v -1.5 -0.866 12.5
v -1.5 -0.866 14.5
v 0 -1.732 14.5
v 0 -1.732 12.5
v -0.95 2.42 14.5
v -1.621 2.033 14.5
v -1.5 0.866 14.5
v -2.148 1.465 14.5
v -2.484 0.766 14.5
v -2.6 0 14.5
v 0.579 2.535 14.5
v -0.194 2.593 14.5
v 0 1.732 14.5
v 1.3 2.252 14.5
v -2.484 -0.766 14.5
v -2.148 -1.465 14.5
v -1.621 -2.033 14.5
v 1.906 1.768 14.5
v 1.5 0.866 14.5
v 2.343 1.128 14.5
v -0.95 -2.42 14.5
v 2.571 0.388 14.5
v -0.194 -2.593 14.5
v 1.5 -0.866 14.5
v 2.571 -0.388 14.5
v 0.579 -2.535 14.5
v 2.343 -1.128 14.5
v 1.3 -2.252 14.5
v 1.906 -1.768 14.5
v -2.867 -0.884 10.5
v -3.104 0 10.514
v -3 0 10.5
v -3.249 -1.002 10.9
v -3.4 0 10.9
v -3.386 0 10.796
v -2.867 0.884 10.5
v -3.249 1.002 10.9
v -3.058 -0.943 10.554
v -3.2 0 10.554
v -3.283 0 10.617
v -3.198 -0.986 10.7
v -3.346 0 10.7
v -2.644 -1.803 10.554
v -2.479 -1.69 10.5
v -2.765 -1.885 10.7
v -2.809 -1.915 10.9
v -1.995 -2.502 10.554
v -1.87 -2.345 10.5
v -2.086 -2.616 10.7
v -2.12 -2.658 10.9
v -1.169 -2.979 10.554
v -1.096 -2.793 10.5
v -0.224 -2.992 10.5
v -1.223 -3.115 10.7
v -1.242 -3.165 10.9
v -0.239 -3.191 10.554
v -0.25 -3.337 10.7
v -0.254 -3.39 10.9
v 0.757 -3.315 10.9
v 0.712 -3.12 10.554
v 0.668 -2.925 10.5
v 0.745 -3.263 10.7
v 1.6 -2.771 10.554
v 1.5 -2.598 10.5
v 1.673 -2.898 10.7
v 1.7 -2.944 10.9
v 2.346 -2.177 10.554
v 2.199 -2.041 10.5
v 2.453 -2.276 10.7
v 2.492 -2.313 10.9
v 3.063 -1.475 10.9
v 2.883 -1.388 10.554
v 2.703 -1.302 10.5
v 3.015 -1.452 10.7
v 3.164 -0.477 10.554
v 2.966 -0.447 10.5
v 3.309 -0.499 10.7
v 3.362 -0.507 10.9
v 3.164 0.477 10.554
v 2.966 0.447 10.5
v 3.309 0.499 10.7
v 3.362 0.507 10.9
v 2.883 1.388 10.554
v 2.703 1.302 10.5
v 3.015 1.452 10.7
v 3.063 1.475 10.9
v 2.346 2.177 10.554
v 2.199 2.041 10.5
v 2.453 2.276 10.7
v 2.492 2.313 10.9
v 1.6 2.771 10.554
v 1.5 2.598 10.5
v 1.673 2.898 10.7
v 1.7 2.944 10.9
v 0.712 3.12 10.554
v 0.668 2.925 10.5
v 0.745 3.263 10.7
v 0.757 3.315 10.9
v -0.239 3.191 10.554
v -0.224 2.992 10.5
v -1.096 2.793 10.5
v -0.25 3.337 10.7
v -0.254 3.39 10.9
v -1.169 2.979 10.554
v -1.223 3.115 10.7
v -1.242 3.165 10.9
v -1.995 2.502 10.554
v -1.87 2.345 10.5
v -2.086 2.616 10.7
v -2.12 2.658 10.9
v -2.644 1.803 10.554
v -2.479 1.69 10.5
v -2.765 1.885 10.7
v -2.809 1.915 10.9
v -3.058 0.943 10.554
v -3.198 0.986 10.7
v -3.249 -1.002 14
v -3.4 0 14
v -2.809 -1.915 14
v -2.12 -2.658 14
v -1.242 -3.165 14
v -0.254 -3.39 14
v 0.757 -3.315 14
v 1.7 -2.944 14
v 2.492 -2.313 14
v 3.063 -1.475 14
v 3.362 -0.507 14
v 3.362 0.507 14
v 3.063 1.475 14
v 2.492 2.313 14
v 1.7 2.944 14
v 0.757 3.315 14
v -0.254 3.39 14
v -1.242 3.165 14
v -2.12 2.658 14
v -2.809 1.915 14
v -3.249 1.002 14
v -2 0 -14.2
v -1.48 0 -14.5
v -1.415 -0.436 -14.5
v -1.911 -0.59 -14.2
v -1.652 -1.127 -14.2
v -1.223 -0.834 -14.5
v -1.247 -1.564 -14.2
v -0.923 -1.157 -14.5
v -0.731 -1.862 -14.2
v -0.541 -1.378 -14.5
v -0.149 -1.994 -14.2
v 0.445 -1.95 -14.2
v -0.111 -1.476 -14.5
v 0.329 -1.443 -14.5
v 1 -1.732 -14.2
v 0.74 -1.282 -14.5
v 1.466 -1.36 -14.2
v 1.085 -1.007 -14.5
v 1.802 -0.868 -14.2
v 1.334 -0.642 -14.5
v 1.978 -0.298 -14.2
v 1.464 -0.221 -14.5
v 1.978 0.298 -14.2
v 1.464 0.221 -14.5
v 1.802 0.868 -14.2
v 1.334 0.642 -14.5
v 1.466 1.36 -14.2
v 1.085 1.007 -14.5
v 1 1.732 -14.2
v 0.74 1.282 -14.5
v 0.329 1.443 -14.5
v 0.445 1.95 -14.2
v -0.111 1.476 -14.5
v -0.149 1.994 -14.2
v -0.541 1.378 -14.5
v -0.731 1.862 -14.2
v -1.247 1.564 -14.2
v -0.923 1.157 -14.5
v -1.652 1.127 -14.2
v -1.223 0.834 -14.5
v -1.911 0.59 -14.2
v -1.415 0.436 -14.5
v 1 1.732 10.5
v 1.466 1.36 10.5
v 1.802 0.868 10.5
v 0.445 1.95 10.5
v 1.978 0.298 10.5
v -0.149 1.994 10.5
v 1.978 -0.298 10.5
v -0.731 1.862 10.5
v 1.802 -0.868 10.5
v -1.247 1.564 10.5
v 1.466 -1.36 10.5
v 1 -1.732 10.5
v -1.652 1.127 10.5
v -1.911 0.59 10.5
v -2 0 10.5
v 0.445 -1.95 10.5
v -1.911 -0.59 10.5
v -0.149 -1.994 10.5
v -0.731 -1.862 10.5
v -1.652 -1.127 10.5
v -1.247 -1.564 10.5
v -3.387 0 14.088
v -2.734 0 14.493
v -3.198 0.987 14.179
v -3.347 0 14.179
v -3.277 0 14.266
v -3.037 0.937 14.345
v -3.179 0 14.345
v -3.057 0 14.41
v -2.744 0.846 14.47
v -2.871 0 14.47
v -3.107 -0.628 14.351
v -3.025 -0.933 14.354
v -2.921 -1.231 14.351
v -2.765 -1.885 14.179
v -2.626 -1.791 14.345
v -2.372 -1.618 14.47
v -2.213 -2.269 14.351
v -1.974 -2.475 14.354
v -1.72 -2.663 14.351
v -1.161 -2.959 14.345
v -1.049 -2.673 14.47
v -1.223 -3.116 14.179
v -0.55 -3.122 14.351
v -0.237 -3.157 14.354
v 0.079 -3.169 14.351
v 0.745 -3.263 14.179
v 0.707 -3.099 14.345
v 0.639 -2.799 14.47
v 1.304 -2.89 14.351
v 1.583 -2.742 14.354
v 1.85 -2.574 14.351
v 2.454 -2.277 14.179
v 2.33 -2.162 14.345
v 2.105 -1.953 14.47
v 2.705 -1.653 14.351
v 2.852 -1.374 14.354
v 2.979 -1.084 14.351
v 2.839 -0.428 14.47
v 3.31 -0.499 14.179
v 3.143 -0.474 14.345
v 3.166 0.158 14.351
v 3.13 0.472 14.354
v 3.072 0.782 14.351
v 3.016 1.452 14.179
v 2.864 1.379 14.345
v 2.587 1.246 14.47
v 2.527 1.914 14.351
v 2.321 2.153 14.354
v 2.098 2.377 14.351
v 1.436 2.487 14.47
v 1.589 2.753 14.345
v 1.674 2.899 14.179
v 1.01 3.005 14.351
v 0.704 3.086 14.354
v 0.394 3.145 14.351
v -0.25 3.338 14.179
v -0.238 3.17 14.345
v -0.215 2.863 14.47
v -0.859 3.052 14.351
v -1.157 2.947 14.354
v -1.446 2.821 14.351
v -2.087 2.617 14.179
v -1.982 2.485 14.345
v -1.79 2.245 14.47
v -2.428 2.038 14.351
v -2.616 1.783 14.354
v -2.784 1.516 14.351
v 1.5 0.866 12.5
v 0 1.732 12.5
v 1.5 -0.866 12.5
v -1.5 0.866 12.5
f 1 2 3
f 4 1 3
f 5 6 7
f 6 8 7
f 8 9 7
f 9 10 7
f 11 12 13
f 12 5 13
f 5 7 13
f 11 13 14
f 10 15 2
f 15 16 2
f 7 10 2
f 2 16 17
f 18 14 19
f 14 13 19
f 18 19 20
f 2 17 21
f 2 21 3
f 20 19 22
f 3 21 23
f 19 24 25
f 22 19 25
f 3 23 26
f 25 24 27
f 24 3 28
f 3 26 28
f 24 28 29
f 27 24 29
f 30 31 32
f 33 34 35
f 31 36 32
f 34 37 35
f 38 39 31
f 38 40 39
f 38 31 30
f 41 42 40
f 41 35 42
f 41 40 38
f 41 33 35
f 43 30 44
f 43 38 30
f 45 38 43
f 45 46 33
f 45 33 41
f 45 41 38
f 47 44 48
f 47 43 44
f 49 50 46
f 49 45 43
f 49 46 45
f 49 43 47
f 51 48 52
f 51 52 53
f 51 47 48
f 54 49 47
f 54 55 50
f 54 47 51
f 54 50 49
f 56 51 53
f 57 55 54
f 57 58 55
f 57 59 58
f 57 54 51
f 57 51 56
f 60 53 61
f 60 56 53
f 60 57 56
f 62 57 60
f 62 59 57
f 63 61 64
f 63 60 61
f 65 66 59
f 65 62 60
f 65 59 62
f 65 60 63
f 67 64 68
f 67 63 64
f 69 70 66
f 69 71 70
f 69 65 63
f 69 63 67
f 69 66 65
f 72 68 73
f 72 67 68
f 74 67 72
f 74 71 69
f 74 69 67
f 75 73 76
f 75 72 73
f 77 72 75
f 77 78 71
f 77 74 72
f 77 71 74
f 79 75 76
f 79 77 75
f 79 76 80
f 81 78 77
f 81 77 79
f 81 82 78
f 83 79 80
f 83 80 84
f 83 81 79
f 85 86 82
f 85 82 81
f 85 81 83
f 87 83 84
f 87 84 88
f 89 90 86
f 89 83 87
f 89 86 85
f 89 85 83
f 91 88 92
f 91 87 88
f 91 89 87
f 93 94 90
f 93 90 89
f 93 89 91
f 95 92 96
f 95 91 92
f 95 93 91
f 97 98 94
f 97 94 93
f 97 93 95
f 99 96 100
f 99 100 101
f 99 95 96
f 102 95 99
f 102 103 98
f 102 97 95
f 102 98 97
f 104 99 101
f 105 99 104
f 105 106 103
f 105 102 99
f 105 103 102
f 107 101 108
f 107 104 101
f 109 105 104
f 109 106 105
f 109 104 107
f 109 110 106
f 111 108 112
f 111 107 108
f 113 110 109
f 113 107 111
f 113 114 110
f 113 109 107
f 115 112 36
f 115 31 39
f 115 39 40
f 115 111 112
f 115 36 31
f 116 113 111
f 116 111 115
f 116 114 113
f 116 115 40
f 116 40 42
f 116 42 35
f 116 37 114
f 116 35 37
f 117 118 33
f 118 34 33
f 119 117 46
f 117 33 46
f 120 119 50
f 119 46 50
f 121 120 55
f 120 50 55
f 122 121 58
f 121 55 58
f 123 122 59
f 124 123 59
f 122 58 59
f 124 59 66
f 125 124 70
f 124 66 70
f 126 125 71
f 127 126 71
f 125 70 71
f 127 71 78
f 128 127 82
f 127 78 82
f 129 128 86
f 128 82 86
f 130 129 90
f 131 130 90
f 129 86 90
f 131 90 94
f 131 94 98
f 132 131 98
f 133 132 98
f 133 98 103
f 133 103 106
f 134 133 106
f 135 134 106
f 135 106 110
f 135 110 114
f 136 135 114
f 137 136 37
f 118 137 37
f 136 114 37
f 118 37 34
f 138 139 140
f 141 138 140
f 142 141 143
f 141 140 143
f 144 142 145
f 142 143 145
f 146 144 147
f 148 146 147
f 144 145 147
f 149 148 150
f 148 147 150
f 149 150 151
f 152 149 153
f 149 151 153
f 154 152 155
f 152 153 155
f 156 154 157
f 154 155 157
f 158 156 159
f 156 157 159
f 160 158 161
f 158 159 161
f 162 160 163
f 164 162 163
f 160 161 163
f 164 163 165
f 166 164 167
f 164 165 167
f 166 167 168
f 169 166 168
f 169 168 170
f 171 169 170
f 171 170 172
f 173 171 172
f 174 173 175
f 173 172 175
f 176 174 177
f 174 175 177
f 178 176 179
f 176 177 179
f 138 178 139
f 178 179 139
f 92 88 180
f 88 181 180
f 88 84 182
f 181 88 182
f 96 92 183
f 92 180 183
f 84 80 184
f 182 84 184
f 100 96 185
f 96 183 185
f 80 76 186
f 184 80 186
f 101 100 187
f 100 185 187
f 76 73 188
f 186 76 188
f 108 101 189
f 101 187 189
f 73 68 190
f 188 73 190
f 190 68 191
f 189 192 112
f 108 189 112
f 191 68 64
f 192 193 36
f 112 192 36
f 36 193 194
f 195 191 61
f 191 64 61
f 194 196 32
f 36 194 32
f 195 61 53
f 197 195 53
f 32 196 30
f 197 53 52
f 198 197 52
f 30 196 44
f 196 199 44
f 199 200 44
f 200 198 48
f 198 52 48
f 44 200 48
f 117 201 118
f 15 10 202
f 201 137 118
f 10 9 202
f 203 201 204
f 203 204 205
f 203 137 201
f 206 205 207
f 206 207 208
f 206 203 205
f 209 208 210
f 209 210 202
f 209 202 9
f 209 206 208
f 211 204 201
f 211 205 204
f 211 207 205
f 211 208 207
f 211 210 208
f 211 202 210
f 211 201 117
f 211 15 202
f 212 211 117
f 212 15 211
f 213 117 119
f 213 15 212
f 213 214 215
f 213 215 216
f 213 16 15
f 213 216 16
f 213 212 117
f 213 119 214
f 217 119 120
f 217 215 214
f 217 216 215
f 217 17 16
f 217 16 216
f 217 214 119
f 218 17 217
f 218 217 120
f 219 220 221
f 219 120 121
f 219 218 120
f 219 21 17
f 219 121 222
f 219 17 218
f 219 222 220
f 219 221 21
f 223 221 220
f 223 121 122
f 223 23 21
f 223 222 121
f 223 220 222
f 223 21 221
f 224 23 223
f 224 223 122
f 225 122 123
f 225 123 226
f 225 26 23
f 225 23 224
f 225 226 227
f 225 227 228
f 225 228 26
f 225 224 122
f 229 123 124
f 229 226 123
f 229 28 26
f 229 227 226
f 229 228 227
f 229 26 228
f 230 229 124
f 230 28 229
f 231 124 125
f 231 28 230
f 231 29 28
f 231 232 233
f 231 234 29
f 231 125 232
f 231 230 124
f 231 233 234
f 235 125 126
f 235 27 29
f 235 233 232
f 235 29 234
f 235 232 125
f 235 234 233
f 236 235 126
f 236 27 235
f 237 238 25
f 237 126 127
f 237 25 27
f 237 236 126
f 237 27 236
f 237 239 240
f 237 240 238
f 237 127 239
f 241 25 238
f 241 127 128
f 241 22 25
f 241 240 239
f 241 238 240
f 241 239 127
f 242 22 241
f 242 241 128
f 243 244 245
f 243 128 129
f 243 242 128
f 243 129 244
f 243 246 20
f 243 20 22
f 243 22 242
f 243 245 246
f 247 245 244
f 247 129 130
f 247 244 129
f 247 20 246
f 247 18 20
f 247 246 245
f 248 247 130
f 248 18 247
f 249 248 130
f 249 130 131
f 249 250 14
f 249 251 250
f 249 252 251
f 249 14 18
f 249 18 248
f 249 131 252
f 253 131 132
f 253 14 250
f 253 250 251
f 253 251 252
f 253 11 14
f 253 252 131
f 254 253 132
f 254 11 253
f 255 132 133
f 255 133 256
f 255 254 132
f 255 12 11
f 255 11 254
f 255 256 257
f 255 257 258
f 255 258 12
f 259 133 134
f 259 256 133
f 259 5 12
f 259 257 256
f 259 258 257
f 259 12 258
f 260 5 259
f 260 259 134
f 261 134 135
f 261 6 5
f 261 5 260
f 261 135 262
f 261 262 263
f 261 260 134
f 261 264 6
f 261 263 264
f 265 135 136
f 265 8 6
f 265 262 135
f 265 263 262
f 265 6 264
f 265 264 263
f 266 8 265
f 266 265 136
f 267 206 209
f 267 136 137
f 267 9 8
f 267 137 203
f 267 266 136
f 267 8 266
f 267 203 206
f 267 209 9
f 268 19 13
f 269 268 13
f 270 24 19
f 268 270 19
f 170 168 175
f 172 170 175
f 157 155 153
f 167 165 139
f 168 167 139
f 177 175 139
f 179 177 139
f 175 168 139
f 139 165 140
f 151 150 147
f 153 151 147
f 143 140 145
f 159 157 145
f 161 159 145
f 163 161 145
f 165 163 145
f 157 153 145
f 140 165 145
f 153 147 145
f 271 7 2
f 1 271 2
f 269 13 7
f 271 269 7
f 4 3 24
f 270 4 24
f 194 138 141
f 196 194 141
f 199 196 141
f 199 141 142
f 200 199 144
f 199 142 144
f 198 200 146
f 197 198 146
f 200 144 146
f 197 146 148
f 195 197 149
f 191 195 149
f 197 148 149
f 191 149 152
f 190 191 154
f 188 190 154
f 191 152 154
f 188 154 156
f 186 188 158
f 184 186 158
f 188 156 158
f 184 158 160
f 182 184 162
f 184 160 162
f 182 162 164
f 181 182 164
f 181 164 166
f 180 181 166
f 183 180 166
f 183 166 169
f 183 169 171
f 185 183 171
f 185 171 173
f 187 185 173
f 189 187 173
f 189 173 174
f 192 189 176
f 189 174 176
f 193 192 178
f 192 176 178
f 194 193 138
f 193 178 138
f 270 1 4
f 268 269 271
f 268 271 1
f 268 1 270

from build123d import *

# Parameters (mm, degrees)
CHAMFER_1_SIZE      = 0.3
CHAMFER_1_SIZE2     = 0.519615242
FILLET_1_R          = 0.4
FILLET_2_SIZE       = 0.5
FILLET_2_SIZE_2     = 0.8
CUT_EXTRUDE_1_DEPTH = 2


with BuildPart() as part:
    # 草图2 → 旋转1 (revolve)
    with BuildSketch(Plane(origin=(0, 0, 0), x_dir=(0, 0, -1), z_dir=(1, 0, 0)), mode=Mode.PRIVATE) as revolve_1_sk:
        Polygon((-14.5, 0), (-14.5, 3.4), (-10.5, 3.4), (-10.5, 2), (14.5, 2), (14.5, 0), align=None)
    revolve(revolve_1_sk.sketch.rotate(Axis((0, 0, -14.5), (0, 0, 1)), 90), axis=Axis((0, 0, -14.5), (0, 0, 1)))

    # 倒角1
    chamfer_1_edges = [part.edges().sort_by_distance(p)[0] for p in [
        (2, 0, -14.5),
    ]]
    chamfer_1_side = [part.faces().sort_by_distance(p)[0] for p in [
        (2, 0, -2),
    ]]
    chamfer(chamfer_1_edges, length=CHAMFER_1_SIZE, length2=CHAMFER_1_SIZE2, reference=chamfer_1_side[0])

    # 圆角1
    fillet_1_edges = [part.edges().sort_by_distance(p)[0] for p in [
        (3.4, 0, 10.5),
    ]]
    fillet(fillet_1_edges, radius=FILLET_1_R)

    # 圆角2
    # an asymmetric fillet: 0.8, 0.5 mm, written as the material it takes off along each edge
    with BuildSketch(Plane(origin=(0, 0, 14.5), x_dir=(-1, 0, 0), z_dir=(0, 1, 0))) as fillet_2_piece_1:
        with BuildLine():
            Bezier((3.4, -FILLET_2_SIZE), (3.4, 0), (3.4 - FILLET_2_SIZE_2, 0), weights=[1, 0.707106781, 1])
            Line((3.4 - FILLET_2_SIZE_2, 0), (3.4, 0))
            Line((3.4, 0), (3.4, -FILLET_2_SIZE))
        make_face()
    revolve(axis=Axis((0, 0, 14.5), (0, 0, 1)), mode=Mode.SUBTRACT)

    # 草图3 → 切除-拉伸1 (cut)
    with BuildSketch(Plane.XY.offset(14.5)):
        Polygon((0, 1.732050808), (-1.5, 0.866025404), (-1.5, -0.866025404), (0, -1.732050808), (1.5, -0.866025404), (1.5, 0.866025404), align=None)
    extrude(amount=-CUT_EXTRUDE_1_DEPTH, mode=Mode.SUBTRACT)


solid = part.part
